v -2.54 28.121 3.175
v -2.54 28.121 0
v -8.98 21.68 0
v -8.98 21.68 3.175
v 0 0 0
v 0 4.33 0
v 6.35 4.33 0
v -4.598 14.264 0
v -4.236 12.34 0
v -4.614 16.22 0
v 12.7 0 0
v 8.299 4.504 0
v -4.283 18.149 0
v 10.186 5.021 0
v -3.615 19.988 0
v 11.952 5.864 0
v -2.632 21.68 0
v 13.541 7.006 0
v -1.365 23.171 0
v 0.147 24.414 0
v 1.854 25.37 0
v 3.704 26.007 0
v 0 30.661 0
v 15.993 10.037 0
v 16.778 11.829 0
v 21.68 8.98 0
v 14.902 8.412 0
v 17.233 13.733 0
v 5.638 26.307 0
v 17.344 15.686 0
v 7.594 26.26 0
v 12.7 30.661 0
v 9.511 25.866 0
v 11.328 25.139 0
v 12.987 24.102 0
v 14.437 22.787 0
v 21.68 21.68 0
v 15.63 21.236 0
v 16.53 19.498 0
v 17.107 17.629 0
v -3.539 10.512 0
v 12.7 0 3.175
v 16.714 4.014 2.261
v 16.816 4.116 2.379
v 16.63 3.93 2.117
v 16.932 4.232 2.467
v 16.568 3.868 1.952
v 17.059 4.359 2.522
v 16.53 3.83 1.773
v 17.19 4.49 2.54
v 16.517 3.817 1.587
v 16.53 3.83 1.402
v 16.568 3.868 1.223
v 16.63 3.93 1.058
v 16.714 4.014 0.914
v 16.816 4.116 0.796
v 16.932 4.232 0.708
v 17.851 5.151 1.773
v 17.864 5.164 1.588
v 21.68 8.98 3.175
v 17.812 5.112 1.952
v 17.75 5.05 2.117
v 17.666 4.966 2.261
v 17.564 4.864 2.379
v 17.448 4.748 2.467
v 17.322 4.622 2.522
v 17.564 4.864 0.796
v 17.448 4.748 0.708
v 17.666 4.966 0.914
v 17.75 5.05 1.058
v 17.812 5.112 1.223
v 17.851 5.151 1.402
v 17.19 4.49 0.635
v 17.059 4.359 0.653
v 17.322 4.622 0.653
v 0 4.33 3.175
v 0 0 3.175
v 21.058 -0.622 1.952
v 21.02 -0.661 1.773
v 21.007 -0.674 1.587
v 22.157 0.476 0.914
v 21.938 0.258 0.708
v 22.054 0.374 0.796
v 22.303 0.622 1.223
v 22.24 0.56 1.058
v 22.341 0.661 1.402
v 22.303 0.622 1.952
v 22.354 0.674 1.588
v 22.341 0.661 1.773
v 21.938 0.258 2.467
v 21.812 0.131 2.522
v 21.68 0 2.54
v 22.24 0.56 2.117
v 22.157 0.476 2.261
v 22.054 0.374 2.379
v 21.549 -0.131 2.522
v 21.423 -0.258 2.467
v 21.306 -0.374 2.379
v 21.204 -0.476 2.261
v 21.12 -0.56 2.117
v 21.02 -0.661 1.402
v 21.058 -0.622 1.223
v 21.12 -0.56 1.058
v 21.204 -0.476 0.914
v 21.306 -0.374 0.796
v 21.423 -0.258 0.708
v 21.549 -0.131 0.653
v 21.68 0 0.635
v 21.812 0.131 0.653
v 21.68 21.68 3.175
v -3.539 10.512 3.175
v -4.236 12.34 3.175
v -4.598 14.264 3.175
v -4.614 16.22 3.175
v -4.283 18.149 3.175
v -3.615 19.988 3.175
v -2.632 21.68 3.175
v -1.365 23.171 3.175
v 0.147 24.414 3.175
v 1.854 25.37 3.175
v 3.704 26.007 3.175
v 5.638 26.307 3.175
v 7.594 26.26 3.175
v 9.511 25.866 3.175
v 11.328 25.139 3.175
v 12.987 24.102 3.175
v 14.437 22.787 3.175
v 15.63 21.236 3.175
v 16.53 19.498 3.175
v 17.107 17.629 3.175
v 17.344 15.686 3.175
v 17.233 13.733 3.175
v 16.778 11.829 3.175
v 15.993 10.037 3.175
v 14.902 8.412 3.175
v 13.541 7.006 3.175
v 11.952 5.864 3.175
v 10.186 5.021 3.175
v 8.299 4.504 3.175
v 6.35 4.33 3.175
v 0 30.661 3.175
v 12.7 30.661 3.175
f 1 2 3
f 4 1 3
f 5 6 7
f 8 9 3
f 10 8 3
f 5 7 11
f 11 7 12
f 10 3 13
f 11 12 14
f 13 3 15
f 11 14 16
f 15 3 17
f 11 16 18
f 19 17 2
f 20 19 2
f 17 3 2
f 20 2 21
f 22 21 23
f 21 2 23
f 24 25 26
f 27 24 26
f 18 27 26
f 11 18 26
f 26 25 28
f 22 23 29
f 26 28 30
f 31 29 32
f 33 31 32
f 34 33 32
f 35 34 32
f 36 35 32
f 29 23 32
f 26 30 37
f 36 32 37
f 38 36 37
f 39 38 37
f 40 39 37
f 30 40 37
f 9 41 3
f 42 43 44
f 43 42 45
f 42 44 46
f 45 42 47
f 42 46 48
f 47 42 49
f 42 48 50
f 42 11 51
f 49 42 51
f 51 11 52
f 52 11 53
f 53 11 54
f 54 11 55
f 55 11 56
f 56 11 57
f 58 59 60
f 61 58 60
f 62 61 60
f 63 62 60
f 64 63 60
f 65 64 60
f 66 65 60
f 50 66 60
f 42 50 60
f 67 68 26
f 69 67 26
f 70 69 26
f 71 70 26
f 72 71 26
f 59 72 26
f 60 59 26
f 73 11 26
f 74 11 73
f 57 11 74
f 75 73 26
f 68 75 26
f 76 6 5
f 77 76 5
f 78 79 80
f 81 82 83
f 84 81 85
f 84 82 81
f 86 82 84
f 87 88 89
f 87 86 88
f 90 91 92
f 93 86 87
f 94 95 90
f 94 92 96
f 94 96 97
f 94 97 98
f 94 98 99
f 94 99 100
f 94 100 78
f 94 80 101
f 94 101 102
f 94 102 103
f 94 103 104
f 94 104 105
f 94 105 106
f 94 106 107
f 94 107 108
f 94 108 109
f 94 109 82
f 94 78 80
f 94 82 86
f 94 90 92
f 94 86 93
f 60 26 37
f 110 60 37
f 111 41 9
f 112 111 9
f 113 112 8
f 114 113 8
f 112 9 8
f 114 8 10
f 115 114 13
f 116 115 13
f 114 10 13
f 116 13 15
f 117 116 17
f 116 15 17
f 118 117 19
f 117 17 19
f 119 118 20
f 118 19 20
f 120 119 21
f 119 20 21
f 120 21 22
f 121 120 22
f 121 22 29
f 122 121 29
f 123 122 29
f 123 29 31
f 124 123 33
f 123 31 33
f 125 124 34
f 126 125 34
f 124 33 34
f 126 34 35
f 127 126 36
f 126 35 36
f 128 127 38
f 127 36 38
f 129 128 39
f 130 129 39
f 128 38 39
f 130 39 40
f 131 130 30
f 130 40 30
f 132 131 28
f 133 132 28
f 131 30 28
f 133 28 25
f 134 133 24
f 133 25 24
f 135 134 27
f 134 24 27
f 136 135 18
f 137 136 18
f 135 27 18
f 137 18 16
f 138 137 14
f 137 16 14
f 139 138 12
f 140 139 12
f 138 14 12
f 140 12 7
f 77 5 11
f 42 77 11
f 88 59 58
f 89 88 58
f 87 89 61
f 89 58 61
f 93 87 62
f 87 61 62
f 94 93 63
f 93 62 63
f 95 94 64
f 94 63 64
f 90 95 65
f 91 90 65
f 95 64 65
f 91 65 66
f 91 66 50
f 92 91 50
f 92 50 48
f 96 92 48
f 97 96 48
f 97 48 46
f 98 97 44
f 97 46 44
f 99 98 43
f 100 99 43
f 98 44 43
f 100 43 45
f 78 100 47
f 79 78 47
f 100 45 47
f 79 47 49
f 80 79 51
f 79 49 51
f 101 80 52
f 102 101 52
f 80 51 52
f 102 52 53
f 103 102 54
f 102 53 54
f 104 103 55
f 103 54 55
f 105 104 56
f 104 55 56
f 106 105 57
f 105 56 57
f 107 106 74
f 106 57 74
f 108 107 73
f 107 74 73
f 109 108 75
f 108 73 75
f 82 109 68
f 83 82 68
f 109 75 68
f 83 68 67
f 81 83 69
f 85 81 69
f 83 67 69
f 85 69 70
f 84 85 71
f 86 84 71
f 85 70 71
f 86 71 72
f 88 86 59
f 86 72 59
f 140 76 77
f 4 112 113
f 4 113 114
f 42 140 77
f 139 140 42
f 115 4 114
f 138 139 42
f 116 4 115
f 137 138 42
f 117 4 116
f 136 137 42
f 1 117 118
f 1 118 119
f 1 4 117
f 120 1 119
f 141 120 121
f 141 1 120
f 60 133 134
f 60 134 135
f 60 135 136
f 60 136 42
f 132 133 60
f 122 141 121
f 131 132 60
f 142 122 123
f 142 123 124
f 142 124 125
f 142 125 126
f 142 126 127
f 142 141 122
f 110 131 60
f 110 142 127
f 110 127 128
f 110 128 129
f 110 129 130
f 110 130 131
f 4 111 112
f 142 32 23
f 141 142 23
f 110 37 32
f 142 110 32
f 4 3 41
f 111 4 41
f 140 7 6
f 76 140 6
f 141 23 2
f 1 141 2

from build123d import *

# Parameters (mm, degrees)
F1_DEPTH = 3.175
F2_R     = 0.9525
F3_DEPTH = 6.35


# Not quite as in the source:
# - a length typed as a fraction of an inch, garbled in the dataset ("3 / 203.2 mm" for 3/8 in), is restored


with BuildPart() as f1:
    # F0 (on Top) → F1 (new body)
    with BuildSketch(Plane.XY):
        with BuildLine():
            Line((0, 4.3302561211), (0, 0))
            Line((0, 0), (12.7, 0))
            Line((12.7, 0), (15.24, 2.54))
            Line((15.24, 2.54), (21.6802561211, 8.9802561211))
            Line((21.6802561211, 8.9802561211), (21.6802561211, 21.6802561211))
            Line((21.6802561211, 21.6802561211), (12.7, 30.6605122421))
            Line((12.7, 30.6605122421), (0, 30.6605122421))
            Line((0, 30.6605122421), (-2.54, 28.1205122421))
            Line((-2.54, 28.1205122421), (-8.9802561211, 21.6802561211))
            Line((-8.9802561211, 21.6802561211), (-3.5386407003, 10.5120837393))
            ThreePointArc((-3.5386407003, 10.5120837393), (12.1809563452, 24.657632392), (6.35, 4.3302561211))
            Line((6.35, 4.3302561211), (0, 4.3302561211))
        make_face()
    extrude(amount=F1_DEPTH)

    # F2 (on face) → F3 (join)
    with BuildSketch(Plane(origin=(6.35, -6.35, 0), x_dir=(0.7071067812, 0.7071067812, 0), z_dir=(0.7071067812, -0.7071067812, 0))):
        with Locations((15.3302561211, 1.5875)):
            Circle(F2_R)
    extrude(amount=F3_DEPTH)


solid = f1.part
